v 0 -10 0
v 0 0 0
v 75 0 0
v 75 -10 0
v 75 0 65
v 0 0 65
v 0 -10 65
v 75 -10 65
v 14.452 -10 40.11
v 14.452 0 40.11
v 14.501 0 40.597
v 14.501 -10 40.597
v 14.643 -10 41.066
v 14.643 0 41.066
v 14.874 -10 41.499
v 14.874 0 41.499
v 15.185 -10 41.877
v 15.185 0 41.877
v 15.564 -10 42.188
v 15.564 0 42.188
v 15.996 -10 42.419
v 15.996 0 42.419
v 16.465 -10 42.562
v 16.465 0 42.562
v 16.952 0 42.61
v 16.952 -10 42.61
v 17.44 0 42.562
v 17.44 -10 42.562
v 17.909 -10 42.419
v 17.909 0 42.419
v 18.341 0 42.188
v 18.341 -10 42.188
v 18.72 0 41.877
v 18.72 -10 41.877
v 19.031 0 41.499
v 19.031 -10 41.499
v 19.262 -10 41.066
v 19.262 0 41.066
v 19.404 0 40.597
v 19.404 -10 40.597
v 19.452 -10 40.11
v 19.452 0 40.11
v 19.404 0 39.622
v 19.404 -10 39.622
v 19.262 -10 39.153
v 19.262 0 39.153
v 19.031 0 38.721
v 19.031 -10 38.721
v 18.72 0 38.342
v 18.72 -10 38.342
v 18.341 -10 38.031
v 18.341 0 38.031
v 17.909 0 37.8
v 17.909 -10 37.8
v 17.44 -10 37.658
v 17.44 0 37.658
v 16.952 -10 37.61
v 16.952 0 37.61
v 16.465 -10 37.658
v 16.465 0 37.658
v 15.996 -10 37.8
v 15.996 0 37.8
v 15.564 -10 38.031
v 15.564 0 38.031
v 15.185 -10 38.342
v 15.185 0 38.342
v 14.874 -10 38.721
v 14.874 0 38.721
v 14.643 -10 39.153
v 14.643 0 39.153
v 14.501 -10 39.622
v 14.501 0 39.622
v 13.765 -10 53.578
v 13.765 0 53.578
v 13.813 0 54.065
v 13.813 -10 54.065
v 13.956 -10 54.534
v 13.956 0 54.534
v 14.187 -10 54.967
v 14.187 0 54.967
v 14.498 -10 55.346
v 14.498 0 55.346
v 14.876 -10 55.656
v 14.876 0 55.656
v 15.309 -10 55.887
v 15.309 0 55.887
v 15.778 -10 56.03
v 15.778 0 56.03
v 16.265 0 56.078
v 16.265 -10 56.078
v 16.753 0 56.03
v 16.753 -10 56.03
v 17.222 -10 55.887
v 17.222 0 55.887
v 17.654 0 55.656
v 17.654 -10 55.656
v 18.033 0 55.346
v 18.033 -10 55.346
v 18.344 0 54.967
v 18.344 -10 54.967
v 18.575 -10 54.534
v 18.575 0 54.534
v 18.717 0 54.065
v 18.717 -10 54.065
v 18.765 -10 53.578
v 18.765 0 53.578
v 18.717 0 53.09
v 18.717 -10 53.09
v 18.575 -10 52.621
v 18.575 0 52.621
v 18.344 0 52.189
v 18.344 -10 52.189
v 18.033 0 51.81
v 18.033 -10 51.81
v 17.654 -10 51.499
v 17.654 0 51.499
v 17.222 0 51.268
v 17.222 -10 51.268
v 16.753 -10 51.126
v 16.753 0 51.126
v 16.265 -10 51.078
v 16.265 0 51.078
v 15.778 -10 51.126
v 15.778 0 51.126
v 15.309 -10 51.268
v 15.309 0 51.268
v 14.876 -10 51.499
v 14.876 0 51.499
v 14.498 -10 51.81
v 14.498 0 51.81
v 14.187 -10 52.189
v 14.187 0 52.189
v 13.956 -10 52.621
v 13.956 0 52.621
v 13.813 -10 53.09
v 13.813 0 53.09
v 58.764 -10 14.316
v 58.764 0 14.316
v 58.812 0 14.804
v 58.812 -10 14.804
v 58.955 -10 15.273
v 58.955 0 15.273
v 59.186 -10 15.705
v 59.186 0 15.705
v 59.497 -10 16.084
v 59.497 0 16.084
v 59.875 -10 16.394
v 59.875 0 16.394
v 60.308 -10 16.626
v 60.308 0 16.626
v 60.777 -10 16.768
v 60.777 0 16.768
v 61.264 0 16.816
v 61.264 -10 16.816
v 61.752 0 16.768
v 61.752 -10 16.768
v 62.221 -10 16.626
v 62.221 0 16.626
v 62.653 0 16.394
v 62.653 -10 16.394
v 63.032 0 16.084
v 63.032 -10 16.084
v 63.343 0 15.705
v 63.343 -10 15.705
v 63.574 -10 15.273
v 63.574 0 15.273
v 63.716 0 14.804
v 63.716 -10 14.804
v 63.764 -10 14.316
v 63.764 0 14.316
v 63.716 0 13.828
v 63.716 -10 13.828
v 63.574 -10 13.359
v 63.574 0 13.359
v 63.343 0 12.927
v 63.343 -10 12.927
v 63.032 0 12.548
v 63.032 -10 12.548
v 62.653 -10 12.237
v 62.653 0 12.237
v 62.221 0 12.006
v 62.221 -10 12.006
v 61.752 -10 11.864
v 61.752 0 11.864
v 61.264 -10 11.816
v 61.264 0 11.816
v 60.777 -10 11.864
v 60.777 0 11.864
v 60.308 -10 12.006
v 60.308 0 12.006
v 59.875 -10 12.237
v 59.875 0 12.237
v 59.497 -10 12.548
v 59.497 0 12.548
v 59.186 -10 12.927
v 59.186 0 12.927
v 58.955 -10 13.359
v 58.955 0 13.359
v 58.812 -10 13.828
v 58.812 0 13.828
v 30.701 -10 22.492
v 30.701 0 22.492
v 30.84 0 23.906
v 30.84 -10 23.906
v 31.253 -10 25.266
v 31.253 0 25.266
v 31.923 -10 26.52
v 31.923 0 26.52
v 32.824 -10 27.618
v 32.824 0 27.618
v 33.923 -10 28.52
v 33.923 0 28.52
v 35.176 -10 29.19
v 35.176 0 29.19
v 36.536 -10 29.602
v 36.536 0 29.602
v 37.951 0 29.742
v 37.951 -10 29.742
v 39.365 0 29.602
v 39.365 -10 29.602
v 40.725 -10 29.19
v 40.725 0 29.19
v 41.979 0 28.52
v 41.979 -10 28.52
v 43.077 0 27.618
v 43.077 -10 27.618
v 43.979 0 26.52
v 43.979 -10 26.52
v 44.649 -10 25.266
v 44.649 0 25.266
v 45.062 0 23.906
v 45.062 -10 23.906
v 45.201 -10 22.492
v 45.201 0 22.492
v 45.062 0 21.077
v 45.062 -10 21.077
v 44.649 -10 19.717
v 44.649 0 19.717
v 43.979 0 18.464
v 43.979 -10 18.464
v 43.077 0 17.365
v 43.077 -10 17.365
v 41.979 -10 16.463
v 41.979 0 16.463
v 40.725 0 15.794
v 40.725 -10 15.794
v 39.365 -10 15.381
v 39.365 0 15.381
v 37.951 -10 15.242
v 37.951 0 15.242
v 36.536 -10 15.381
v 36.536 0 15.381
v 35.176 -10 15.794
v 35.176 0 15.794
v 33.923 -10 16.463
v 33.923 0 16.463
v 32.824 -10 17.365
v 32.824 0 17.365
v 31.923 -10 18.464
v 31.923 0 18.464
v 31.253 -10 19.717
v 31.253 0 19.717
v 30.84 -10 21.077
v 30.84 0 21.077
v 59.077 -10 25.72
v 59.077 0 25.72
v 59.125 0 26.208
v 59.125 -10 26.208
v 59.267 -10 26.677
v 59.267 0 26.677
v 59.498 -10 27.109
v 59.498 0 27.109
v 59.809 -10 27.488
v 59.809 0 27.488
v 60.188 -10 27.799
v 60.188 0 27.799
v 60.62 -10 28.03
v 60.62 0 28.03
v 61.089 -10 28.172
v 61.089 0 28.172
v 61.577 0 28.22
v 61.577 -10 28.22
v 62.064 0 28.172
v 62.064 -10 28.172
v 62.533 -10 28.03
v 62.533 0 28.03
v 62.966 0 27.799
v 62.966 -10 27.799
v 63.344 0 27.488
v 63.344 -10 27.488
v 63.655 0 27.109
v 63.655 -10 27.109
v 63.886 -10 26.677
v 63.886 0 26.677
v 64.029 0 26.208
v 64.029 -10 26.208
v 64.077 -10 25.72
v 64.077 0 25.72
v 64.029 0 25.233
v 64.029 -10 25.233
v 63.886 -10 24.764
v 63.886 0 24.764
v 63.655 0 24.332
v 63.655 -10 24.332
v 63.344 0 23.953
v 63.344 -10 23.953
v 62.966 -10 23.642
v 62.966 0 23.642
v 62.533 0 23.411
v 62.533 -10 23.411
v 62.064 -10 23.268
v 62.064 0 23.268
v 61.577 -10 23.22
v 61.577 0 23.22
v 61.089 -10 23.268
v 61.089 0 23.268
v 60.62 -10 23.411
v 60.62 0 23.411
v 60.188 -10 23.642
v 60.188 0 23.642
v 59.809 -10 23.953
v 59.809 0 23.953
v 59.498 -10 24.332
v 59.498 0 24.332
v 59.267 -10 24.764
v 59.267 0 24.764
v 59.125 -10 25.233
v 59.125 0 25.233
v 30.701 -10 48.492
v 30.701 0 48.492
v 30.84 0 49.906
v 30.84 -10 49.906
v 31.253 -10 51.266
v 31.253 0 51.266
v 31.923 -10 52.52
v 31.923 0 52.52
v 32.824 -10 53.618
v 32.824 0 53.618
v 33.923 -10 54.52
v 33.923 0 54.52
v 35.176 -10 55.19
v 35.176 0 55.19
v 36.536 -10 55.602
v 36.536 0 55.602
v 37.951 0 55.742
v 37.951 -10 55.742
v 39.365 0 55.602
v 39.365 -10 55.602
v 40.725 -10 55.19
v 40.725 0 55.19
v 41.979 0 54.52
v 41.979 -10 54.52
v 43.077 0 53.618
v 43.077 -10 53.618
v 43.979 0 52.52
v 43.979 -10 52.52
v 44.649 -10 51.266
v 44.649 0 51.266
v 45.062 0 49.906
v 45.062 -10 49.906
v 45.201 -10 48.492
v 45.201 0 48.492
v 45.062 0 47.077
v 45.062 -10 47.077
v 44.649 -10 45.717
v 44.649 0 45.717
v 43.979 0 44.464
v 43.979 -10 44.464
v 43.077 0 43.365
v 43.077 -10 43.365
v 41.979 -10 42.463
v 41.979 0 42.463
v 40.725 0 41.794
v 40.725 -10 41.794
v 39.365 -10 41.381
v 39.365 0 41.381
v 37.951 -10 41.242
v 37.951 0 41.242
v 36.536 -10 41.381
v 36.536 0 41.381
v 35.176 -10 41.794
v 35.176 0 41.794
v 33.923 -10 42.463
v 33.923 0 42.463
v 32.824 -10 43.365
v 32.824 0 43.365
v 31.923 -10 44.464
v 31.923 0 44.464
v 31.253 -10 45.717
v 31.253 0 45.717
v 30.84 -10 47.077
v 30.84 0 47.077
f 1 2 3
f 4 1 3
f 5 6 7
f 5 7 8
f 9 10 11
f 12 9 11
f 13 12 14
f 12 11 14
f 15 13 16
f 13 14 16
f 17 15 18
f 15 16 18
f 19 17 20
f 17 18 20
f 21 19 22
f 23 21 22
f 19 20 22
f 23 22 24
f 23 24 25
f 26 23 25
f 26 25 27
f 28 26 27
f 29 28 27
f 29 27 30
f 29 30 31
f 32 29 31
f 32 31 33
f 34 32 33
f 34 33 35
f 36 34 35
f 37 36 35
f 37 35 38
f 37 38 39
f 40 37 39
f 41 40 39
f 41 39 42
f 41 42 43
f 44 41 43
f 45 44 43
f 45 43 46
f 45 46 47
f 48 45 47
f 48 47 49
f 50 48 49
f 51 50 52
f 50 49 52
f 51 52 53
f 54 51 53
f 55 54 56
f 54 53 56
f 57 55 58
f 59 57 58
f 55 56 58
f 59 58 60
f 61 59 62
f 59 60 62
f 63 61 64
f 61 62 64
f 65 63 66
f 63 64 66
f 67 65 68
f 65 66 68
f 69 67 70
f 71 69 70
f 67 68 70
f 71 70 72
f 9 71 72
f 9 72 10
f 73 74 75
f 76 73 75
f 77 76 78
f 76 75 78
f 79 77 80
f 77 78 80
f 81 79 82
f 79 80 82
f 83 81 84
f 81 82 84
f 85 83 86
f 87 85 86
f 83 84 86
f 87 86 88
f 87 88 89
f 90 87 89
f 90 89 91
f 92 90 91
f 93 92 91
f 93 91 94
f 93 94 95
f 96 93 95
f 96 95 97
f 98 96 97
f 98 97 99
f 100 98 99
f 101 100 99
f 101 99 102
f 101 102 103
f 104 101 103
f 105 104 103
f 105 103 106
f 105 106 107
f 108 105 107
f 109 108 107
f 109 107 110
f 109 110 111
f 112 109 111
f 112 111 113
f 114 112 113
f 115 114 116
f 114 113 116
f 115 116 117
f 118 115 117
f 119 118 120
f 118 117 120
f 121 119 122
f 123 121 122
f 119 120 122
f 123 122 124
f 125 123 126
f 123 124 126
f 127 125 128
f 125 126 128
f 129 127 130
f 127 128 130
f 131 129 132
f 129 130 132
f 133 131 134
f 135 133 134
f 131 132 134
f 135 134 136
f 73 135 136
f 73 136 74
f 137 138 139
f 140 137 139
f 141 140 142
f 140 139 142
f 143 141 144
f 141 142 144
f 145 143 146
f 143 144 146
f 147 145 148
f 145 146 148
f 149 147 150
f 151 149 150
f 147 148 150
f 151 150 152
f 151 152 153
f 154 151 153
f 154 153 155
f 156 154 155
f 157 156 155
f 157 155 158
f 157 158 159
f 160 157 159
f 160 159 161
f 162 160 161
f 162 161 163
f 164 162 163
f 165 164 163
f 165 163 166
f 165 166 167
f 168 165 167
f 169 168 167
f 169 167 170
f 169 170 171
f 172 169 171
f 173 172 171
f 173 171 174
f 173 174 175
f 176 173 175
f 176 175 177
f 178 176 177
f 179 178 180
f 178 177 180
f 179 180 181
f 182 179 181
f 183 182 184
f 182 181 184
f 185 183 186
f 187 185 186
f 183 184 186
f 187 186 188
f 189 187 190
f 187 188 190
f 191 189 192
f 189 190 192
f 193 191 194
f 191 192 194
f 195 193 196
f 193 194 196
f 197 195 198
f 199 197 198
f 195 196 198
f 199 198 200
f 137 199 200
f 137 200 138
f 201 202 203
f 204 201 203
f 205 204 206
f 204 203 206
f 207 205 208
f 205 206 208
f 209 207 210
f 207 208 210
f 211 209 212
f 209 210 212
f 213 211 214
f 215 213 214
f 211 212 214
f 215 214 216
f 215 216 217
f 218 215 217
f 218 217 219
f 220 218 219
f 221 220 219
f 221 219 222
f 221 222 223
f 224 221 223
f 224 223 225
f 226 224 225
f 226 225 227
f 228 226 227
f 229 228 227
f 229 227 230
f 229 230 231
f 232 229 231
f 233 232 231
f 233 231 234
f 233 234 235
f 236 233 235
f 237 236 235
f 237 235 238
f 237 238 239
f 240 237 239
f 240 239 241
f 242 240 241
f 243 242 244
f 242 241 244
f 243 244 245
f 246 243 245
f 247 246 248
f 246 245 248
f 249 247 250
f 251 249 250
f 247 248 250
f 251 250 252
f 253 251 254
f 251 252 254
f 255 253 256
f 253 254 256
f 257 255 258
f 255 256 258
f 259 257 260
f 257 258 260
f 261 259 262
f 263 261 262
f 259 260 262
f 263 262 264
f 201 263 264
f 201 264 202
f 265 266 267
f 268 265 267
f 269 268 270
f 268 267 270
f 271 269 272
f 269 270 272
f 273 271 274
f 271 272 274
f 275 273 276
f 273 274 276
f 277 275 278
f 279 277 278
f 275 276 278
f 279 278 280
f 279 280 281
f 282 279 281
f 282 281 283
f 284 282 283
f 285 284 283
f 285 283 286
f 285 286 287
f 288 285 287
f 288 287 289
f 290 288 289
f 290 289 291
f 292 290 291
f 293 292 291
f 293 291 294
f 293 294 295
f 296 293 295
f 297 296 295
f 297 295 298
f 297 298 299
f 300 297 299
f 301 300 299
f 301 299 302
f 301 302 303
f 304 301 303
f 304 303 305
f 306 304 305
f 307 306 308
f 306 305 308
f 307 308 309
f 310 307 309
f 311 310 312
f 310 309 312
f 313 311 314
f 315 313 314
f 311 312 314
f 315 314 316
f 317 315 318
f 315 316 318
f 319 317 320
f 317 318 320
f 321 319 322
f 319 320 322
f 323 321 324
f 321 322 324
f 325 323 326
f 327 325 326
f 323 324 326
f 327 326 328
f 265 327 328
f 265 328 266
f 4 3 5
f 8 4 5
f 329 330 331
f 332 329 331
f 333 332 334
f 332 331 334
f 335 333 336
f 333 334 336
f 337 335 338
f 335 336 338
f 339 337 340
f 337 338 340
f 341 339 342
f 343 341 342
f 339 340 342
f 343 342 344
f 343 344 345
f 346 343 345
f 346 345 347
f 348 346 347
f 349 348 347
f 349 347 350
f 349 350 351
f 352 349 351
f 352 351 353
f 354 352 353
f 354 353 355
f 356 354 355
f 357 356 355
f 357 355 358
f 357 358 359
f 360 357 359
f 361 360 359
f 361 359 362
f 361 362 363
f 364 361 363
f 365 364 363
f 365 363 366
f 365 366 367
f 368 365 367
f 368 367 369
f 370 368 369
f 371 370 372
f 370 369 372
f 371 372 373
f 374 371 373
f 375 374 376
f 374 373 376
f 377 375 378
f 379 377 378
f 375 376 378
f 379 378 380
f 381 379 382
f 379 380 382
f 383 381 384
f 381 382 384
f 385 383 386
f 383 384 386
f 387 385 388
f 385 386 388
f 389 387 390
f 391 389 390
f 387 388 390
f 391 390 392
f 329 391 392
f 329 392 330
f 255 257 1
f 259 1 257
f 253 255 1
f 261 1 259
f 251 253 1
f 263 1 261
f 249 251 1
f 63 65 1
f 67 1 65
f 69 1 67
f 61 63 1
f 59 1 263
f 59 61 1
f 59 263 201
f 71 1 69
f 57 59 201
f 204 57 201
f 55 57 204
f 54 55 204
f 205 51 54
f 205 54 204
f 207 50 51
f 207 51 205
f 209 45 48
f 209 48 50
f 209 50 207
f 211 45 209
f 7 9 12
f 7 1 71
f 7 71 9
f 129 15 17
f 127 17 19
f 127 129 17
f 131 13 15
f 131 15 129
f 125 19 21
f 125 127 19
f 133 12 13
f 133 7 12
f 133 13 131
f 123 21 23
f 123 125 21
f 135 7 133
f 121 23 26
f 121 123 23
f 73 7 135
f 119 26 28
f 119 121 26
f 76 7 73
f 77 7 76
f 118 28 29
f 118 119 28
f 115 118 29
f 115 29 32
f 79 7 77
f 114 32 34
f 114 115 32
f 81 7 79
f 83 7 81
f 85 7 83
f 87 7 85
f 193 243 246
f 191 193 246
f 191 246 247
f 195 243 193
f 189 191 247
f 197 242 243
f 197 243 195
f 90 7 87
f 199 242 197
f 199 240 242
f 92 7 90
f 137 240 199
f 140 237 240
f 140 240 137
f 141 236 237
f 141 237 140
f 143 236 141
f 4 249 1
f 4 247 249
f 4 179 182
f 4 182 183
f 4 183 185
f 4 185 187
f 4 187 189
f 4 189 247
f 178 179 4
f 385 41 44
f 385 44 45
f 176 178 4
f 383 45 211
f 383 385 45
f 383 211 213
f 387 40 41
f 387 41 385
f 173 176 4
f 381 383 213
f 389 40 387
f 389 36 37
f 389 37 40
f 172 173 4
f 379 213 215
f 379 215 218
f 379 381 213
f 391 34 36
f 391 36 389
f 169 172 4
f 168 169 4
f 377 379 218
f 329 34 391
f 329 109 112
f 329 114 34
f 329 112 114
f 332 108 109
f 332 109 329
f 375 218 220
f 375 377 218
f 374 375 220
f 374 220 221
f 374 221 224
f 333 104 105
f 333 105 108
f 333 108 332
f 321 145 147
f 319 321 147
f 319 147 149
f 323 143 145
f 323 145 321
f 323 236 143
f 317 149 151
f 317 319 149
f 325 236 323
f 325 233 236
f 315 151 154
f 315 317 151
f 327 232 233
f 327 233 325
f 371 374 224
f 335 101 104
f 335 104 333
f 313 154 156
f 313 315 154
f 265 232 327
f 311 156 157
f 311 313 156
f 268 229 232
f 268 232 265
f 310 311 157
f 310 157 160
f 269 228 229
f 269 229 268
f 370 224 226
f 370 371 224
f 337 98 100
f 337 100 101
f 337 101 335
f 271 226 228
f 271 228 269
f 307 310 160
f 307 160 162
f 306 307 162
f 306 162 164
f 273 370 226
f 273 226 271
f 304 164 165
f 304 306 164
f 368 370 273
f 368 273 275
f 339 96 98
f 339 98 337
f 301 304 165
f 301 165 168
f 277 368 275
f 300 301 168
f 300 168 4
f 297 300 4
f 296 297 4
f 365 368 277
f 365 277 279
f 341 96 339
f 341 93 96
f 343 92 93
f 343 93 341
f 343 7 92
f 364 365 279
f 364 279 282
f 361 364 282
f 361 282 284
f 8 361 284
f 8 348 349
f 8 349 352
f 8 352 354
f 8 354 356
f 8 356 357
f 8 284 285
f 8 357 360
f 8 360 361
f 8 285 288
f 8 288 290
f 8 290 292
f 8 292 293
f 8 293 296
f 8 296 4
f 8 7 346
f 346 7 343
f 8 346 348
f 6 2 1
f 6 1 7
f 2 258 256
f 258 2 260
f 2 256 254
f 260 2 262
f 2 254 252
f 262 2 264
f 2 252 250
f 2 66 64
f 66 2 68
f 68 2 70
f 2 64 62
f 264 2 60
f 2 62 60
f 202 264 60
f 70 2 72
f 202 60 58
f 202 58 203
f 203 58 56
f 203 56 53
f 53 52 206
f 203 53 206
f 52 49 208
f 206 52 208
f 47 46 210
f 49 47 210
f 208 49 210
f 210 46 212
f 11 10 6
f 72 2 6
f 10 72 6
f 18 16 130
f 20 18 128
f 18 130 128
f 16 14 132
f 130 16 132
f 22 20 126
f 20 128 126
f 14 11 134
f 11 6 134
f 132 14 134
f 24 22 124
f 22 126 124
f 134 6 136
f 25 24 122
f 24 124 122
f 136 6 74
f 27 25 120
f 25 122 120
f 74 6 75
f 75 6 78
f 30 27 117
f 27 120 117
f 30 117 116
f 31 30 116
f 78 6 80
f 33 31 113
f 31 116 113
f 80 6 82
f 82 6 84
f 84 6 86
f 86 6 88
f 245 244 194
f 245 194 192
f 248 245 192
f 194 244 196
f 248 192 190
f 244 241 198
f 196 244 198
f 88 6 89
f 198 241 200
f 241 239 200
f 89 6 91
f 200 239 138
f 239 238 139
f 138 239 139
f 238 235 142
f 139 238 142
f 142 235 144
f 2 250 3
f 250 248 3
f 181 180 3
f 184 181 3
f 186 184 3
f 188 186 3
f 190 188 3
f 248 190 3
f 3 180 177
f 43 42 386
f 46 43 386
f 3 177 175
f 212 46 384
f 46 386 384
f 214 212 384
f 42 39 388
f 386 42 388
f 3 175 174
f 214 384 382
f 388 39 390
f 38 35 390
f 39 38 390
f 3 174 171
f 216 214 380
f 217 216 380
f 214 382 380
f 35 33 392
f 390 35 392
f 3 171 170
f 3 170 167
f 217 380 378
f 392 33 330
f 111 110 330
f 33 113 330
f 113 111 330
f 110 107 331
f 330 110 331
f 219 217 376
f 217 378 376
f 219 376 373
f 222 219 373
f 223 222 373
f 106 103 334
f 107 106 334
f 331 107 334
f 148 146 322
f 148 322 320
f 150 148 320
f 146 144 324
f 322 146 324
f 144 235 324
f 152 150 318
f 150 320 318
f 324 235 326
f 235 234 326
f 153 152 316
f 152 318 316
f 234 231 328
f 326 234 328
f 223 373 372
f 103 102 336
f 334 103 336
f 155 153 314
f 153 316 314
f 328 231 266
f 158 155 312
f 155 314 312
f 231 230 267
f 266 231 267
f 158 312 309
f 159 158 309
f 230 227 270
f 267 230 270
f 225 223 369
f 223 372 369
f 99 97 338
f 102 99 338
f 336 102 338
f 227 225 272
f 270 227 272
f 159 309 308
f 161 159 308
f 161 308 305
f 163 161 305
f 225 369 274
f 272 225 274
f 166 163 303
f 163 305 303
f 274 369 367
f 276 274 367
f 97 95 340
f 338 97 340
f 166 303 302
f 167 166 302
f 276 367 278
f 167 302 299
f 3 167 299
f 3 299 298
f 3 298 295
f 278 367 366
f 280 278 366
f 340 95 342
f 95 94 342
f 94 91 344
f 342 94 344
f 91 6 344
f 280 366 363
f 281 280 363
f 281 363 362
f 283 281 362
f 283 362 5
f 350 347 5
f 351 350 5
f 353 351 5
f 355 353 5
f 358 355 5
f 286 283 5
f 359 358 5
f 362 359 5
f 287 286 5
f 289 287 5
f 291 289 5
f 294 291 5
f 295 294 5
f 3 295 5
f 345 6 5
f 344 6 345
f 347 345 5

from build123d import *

# Parameters (mm, degrees)
F0_W     = 75
F0_H     = 65
F1_DEPTH = 10
F3_D     = 14.5
F5_D     = 5


with BuildPart() as f1:
    # F0 (on Front) → F1 (new body)
    with BuildSketch(Plane.XZ):
        with Locations((37.5, 32.5)):
            Rectangle(F0_W, F0_H)
    extrude(amount=F1_DEPTH)

    # F3 (through all)
    with Locations(Plane.XZ.offset(10)):
        with Locations((37.950881, 48.491641), (37.950881, 22.491641)):
            Hole(F3_D / 2)

    # F5 (through all)
    with Locations(Plane.XZ.offset(10)):
        with Locations((16.265364, 53.577758), (16.952468, 40.109664), (61.576582, 25.720431), (61.264336, 14.315818)):
            Hole(F5_D / 2)


solid = f1.part
